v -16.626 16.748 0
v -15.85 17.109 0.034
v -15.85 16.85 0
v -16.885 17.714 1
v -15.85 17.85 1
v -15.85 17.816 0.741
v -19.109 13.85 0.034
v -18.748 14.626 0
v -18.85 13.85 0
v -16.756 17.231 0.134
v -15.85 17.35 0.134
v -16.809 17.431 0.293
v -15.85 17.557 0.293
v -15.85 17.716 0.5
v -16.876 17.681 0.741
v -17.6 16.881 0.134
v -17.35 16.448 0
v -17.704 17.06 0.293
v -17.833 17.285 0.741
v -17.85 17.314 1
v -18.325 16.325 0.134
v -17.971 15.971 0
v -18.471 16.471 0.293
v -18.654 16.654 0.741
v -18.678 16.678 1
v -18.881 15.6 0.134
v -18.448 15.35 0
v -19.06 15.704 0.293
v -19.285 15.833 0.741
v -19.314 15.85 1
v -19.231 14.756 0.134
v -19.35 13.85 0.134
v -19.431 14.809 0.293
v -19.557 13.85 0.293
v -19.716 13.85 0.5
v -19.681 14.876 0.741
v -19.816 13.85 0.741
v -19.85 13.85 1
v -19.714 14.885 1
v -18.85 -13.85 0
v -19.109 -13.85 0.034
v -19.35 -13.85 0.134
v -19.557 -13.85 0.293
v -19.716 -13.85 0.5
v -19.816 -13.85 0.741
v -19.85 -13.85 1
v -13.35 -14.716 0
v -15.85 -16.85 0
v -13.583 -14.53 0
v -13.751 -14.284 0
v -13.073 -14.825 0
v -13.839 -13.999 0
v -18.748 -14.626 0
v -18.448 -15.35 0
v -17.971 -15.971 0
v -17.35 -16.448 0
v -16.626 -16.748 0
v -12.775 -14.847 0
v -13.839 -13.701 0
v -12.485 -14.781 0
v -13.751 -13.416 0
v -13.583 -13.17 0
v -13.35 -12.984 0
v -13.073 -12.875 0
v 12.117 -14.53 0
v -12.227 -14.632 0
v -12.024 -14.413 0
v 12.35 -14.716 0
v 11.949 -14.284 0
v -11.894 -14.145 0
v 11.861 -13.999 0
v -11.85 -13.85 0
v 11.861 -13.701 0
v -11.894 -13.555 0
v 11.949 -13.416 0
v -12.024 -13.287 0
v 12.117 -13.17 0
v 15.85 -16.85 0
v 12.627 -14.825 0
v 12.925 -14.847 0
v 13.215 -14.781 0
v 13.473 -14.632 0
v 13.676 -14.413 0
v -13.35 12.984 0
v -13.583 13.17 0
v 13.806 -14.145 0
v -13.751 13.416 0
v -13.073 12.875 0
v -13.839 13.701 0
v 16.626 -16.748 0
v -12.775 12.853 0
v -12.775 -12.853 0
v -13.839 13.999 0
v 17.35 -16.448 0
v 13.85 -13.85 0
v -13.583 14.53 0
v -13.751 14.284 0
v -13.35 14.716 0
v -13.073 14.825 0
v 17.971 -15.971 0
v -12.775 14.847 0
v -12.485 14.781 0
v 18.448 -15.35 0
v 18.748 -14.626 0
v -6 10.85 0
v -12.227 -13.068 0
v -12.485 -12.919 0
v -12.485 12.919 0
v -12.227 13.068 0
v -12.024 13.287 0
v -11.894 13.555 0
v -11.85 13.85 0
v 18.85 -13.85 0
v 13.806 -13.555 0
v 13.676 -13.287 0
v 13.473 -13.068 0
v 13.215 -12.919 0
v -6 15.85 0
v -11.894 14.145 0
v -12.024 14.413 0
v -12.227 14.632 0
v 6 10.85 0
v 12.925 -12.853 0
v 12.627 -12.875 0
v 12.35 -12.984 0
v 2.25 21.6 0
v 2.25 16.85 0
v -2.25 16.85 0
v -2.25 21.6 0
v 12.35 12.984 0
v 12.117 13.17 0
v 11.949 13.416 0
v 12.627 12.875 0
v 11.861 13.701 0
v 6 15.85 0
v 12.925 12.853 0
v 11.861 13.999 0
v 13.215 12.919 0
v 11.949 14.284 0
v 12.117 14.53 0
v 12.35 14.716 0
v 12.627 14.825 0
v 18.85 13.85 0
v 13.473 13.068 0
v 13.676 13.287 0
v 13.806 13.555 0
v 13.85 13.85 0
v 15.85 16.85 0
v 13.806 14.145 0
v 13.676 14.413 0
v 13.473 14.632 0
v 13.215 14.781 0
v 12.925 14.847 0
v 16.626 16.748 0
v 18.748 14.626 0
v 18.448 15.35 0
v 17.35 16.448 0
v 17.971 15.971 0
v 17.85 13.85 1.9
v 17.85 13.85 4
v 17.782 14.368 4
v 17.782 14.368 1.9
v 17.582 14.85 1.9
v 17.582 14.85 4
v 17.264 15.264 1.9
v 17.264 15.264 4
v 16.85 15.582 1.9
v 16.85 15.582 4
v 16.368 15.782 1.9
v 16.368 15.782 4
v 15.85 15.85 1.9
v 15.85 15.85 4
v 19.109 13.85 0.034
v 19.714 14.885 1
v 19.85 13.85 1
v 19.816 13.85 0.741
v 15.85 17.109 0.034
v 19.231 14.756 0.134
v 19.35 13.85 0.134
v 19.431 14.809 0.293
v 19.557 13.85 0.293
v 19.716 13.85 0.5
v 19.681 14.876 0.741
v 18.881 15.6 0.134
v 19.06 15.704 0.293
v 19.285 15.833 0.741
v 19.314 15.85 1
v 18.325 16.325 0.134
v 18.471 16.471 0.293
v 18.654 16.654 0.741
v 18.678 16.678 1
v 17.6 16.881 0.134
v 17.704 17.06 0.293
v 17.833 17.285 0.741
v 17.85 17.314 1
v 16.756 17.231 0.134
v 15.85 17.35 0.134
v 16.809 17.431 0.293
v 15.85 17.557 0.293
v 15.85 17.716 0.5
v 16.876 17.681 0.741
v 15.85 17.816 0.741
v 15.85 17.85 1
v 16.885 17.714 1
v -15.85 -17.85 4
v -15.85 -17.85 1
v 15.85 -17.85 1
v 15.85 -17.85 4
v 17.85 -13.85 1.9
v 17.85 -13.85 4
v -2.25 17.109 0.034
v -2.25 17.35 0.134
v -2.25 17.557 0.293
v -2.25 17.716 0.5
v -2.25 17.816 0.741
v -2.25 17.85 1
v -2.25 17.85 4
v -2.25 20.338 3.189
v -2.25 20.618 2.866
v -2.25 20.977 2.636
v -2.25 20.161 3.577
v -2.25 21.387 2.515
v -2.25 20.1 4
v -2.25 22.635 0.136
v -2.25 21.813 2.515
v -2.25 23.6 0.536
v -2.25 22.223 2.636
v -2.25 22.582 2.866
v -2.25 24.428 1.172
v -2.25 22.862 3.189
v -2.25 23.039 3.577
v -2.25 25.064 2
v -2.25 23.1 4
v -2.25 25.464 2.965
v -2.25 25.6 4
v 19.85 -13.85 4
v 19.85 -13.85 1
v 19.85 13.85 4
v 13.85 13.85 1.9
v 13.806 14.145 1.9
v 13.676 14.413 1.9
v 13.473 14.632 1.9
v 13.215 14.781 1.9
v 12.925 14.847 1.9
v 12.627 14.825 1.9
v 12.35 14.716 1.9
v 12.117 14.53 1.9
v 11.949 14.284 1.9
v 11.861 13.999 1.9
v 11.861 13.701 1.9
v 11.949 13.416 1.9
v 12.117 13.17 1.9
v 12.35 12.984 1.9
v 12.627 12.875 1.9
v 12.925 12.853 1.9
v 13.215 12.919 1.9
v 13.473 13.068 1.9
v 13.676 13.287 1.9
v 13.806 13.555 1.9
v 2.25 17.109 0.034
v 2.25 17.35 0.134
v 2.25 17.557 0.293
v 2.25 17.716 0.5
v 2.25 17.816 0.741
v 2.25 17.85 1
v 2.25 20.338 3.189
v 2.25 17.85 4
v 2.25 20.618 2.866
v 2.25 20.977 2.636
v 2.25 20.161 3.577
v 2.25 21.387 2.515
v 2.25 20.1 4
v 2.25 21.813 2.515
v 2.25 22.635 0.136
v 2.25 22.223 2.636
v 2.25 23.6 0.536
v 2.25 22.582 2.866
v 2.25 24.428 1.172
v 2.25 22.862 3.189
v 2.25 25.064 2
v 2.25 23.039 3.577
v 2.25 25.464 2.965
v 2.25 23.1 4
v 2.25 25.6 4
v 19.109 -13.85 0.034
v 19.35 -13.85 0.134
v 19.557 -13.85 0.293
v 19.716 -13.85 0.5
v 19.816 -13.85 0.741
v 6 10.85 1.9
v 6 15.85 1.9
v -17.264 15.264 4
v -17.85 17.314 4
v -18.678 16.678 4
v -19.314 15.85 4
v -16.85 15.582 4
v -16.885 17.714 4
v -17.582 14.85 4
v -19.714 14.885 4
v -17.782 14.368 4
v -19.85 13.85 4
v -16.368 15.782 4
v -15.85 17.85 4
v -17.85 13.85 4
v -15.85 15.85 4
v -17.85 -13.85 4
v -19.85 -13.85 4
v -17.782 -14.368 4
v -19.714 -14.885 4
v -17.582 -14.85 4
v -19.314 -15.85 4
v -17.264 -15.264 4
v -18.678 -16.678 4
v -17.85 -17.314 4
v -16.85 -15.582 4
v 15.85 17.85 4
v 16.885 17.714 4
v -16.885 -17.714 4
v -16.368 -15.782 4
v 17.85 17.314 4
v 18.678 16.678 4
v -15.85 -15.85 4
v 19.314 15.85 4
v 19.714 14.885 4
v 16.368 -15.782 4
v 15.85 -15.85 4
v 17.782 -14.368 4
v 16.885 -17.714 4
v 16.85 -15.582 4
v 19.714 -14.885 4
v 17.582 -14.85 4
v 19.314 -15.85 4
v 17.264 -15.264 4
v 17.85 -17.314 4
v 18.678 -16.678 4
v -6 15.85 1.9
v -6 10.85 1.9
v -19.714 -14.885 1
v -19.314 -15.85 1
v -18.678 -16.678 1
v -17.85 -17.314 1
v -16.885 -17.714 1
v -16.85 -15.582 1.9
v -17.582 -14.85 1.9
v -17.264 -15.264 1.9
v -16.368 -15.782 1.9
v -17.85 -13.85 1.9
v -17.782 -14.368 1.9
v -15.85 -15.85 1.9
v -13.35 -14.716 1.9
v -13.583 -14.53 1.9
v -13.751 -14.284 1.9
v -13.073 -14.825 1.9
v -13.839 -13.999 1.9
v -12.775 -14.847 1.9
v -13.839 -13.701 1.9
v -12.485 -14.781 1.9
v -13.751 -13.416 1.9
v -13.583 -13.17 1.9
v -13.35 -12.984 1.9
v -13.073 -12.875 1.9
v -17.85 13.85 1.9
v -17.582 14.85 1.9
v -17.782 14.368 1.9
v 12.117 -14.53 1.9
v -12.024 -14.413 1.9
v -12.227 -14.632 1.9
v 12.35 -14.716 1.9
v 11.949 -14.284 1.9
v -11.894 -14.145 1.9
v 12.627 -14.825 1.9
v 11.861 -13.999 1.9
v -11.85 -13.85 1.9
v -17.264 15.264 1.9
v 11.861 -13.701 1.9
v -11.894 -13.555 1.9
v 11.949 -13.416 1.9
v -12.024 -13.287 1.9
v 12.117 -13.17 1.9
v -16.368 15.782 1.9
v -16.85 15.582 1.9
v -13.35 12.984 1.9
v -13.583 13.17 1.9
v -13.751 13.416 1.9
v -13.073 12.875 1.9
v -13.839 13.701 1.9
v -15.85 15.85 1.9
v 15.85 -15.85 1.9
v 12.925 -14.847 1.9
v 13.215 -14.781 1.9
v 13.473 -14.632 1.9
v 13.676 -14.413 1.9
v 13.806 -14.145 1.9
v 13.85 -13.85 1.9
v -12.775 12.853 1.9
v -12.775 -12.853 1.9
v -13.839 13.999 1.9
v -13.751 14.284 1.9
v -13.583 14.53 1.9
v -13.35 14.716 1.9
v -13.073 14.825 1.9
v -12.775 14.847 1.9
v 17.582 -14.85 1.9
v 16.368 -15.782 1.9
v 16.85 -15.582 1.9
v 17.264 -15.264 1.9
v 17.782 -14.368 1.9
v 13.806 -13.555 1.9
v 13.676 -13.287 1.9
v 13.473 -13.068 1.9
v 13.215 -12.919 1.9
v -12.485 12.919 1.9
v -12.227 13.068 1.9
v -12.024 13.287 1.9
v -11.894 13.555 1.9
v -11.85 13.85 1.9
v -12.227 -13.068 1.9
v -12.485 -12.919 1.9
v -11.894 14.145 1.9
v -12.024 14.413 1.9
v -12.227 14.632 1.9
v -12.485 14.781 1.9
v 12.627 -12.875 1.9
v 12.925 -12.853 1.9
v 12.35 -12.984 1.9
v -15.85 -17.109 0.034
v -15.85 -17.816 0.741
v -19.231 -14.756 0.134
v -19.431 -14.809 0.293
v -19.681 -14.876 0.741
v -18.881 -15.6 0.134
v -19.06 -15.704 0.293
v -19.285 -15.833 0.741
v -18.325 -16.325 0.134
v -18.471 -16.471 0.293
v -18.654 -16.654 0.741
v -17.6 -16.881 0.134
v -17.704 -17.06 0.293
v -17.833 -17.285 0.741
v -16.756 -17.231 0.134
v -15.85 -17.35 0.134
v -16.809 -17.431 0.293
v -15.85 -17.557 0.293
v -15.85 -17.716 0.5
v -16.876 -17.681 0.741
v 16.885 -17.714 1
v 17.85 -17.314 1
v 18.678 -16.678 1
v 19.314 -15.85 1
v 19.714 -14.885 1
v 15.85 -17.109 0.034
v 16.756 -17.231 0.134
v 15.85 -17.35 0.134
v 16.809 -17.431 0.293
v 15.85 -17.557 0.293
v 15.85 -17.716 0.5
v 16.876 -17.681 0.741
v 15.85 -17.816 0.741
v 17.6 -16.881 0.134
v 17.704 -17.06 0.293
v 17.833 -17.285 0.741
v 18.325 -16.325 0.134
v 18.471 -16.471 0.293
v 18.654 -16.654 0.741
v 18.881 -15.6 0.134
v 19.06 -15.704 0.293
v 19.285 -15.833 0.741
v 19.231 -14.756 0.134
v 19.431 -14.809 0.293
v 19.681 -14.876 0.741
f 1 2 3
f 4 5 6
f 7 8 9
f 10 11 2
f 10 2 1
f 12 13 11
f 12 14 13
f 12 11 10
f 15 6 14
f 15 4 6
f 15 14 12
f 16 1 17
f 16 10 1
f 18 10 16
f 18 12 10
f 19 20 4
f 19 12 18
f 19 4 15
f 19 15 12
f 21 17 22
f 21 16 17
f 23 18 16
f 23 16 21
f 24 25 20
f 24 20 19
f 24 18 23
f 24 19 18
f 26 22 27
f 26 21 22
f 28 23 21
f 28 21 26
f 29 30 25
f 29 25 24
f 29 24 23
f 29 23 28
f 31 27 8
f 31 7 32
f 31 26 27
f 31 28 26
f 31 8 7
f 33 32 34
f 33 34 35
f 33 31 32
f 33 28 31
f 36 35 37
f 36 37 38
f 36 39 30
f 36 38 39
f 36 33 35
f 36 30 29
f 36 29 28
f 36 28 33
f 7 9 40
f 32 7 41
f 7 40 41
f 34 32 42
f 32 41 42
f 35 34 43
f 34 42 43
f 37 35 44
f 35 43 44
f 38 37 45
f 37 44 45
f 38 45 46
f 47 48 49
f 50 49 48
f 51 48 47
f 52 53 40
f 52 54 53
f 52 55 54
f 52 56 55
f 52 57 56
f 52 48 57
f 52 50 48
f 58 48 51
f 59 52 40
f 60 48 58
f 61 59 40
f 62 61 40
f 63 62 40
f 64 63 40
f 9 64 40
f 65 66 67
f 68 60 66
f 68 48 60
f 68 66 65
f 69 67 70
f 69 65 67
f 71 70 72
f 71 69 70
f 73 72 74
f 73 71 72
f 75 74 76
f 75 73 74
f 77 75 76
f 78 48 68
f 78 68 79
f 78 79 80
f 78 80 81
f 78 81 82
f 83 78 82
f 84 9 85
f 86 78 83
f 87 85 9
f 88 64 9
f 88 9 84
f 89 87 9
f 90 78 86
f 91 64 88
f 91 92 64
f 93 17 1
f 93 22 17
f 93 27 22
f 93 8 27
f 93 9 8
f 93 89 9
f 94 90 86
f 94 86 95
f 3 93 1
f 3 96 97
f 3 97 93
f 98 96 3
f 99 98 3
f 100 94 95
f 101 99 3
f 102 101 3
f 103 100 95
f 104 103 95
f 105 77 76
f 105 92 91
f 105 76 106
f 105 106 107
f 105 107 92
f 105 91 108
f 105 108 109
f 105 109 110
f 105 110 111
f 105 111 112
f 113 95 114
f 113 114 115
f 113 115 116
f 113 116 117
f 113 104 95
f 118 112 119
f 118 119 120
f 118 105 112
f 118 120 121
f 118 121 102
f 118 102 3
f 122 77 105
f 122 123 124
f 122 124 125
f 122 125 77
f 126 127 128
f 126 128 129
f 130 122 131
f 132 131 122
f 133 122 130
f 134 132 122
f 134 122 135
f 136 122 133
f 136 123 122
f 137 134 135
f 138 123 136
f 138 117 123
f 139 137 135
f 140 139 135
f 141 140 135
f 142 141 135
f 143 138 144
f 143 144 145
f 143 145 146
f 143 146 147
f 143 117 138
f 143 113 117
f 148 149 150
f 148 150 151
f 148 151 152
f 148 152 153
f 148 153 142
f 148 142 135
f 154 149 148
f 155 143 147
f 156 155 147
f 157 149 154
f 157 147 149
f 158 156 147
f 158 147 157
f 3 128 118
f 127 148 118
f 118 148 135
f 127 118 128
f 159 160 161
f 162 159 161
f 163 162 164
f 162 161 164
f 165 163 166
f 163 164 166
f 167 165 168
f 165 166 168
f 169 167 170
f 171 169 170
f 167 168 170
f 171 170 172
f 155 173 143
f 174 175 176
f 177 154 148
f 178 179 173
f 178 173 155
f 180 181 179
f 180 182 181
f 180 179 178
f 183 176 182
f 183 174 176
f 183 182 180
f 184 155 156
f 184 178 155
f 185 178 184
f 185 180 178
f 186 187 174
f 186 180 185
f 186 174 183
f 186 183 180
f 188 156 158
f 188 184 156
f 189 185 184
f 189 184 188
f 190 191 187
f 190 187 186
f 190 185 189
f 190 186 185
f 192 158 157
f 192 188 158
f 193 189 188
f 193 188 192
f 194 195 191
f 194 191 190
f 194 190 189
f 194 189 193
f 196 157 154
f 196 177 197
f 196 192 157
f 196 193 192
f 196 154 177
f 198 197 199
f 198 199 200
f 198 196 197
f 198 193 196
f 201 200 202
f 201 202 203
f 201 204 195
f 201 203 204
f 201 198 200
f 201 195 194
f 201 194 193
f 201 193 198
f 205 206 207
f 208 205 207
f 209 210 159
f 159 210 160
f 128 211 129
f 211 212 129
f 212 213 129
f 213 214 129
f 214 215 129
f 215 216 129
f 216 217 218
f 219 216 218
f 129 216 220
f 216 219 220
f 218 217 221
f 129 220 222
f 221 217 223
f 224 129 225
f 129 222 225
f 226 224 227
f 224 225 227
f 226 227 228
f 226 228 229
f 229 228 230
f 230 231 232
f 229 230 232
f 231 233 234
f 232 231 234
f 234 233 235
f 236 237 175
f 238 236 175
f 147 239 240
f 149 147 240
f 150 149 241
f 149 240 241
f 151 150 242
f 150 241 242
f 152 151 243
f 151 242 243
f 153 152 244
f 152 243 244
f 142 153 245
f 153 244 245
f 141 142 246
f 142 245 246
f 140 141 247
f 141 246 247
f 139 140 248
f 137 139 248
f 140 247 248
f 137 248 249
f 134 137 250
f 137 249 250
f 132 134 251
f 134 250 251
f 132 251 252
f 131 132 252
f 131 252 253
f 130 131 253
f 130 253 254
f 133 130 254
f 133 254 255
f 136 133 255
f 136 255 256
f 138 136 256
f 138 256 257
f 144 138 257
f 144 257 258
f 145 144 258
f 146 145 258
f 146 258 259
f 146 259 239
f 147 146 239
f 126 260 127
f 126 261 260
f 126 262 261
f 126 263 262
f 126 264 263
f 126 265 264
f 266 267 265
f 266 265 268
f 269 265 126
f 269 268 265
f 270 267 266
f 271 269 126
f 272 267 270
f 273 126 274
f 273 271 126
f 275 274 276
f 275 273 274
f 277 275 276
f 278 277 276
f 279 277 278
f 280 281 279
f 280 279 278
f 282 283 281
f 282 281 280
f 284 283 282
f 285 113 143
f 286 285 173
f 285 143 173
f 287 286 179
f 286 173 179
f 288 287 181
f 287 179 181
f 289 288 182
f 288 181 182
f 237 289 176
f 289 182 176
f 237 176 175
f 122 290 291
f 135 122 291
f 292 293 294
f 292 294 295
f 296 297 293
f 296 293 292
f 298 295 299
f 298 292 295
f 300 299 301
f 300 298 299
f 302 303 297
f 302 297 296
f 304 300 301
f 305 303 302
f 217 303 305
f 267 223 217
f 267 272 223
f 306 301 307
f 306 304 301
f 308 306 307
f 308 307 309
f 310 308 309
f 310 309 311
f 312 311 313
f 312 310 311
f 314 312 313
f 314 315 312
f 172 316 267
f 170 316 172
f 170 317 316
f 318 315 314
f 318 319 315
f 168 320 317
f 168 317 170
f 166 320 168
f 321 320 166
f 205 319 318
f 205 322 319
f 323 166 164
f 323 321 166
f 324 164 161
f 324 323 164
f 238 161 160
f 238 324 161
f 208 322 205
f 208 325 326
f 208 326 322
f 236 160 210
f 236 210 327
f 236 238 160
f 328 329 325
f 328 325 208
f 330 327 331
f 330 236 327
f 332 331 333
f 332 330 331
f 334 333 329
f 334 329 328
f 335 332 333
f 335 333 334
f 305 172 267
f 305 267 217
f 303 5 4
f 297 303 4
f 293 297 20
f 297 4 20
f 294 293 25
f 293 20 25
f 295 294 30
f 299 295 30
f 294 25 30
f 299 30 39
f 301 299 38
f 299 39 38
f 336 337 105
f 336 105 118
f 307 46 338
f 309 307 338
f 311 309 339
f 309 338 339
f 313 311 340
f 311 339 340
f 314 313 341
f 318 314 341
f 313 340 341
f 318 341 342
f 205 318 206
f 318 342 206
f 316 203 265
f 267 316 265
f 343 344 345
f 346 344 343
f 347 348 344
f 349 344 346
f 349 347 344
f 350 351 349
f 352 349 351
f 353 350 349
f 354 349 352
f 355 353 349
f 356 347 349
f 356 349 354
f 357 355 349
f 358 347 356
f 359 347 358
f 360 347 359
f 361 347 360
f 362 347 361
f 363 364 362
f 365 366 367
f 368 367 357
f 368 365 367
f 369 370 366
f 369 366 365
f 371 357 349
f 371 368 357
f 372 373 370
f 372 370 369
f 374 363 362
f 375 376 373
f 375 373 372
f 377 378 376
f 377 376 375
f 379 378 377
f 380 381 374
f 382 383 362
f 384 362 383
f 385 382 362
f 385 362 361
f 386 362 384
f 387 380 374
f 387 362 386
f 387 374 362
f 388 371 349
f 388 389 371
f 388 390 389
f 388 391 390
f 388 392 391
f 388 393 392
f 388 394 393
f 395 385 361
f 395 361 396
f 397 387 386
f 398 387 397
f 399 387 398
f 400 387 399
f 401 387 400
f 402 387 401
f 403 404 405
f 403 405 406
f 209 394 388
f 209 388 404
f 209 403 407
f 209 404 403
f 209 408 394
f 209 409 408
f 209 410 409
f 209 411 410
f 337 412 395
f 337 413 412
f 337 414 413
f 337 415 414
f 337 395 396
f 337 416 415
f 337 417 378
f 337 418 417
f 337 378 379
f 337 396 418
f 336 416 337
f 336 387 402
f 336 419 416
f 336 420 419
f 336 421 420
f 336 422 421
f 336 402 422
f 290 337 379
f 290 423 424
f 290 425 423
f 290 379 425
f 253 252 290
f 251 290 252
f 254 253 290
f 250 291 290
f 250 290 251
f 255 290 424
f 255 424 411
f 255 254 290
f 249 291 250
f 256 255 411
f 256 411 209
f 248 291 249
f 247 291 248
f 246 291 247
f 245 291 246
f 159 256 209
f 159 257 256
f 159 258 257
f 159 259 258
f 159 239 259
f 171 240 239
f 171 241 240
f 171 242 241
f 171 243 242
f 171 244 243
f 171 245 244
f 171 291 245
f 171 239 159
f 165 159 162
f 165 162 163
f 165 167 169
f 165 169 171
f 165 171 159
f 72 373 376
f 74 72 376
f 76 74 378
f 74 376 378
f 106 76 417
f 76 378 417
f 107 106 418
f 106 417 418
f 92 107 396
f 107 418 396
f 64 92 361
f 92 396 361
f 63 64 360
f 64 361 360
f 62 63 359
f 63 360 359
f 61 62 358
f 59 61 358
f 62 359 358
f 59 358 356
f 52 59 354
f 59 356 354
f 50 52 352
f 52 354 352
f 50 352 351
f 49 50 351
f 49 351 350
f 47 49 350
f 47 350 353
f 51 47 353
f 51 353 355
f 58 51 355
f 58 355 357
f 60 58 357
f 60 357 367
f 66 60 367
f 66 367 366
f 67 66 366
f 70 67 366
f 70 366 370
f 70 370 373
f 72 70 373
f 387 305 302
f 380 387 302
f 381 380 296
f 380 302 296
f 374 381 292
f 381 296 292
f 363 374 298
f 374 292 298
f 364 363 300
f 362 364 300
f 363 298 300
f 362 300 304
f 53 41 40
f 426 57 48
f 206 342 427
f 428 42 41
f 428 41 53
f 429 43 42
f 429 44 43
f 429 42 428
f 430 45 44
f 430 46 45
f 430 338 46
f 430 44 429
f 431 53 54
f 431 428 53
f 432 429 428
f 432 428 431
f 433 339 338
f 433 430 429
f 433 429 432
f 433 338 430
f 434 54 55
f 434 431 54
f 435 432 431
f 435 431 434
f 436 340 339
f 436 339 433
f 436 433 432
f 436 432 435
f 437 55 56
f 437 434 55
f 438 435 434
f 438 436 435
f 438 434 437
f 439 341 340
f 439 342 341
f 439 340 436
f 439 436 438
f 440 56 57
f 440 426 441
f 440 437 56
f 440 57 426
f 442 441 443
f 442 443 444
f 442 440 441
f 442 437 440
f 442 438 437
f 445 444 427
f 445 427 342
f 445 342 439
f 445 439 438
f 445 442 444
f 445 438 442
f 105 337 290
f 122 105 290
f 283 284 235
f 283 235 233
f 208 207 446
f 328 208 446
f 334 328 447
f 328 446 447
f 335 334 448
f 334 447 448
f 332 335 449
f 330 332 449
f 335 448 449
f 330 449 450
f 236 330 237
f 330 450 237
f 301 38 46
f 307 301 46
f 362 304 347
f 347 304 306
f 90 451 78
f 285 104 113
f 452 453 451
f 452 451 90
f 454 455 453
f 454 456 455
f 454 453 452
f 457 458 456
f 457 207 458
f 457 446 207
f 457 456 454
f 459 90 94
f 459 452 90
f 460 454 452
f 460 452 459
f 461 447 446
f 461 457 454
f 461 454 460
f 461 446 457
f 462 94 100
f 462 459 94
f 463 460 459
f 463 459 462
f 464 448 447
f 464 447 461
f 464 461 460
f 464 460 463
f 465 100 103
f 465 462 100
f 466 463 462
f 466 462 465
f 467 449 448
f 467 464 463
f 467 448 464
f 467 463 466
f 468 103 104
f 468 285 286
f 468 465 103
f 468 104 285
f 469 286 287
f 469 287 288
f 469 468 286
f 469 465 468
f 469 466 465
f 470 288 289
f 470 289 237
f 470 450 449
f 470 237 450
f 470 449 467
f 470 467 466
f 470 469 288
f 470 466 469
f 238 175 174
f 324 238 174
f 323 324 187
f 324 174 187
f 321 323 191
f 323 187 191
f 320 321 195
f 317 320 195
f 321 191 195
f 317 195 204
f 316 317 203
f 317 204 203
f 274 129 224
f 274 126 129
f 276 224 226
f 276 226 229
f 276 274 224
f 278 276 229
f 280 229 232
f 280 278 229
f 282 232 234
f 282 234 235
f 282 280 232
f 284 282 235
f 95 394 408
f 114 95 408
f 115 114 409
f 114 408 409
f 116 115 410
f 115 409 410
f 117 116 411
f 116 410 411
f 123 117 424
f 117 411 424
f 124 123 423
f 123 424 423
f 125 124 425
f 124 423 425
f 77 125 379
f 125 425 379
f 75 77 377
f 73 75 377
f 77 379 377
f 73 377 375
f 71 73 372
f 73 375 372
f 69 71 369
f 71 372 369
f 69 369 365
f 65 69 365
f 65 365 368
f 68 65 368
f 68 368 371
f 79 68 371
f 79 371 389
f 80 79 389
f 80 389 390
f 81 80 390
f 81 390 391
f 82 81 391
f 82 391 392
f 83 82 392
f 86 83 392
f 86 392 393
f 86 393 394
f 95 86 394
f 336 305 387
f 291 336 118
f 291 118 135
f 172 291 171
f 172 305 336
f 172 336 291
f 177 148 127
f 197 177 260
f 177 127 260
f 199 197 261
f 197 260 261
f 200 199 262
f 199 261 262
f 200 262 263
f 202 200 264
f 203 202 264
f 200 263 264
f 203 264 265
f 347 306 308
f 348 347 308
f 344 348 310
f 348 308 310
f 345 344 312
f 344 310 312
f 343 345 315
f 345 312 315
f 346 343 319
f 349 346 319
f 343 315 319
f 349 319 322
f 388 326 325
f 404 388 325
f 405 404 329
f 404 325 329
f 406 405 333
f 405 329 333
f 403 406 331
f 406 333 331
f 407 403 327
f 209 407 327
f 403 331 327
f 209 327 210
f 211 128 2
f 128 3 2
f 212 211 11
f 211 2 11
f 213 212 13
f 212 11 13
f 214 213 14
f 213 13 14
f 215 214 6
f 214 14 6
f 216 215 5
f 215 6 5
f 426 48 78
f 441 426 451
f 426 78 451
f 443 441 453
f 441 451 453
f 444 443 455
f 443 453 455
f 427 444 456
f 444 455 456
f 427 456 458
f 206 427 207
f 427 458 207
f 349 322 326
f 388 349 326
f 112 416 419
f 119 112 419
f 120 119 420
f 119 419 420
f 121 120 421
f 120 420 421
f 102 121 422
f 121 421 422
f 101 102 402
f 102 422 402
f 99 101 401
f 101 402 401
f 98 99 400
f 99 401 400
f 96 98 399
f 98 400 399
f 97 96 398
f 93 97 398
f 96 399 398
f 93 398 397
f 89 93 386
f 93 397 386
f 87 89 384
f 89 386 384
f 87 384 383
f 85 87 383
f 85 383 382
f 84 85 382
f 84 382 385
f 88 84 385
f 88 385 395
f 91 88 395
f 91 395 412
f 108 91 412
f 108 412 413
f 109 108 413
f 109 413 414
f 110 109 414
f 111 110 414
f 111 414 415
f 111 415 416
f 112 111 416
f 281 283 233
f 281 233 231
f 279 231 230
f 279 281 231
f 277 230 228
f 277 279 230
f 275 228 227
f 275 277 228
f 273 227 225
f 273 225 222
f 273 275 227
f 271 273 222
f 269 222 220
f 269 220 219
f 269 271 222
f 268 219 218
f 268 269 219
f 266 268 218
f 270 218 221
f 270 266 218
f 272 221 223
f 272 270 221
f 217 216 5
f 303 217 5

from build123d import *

# Parameters (mm, degrees)
F1_DEPTH      = 4
F3_DEPTH      = 2.1
F5_DEPTH      = 2.25
F5_DEPTH_BACK = 2.25
F6_W          = 12
F6_H          = 5
F6_R          = 1
F7_DEPTH      = 25
F8_R          = 1


with BuildPart() as f1:
    # F0 (on Top) → F1 (new body)
    with BuildSketch(Plane.XY):
        with BuildLine():
            Line((19.85, -13.85), (19.85, 13.85))
            ThreePointArc((19.85, 13.85), (18.678427, 16.678427), (15.85, 17.85))
            Line((15.85, 17.85), (-15.85, 17.85))
            ThreePointArc((-15.85, 17.85), (-18.678427, 16.678427), (-19.85, 13.85))
            Line((-19.85, 13.85), (-19.85, -13.85))
            ThreePointArc((-19.85, -13.85), (-18.678427, -16.678427), (-15.85, -17.85))
            Line((-15.85, -17.85), (15.85, -17.85))
            ThreePointArc((15.85, -17.85), (18.678427, -16.678427), (19.85, -13.85))
        make_face()
    extrude(amount=F1_DEPTH)

    # F2 (on face) → F3 (cut)
    with BuildSketch(Plane.XY.offset(4)):
        with BuildLine():
            ThreePointArc((17.85, 13.85), (17.264214, 15.264214), (15.85, 15.85))
            Line((15.85, 15.85), (-15.85, 15.85))
            ThreePointArc((-15.85, 15.85), (-17.264214, 15.264214), (-17.85, 13.85))
            Line((-17.85, 13.85), (-17.85, -13.85))
            ThreePointArc((-17.85, -13.85), (-17.264214, -15.264214), (-15.85, -15.85))
            Line((-15.85, -15.85), (15.85, -15.85))
            ThreePointArc((15.85, -15.85), (17.264214, -15.264214), (17.85, -13.85))
            Line((17.85, -13.85), (17.85, 13.85))
        make_face()
    extrude(amount=-F3_DEPTH, mode=Mode.SUBTRACT)

    # F4 (on Right) → F5 (join, two sides)
    with BuildSketch(Plane.YZ) as f5_sk:
        with BuildLine():
            Line((17.85, 0), (21.6, 0))
            ThreePointArc((21.6, 0), (24.428427, 1.171573), (25.6, 4))
            Line((25.6, 4), (23.1, 4))
            ThreePointArc((23.1, 4), (21.6, 2.5), (20.1, 4))
            Line((20.1, 4), (17.85, 4))
            Line((17.85, 4), (17.85, 0))
        make_face()
        Polygon((15.85, 0), (17.85, 0), (17.85, 4), (17.6, 4), (15.85, 4), align=None)
    extrude(amount=F5_DEPTH)
    extrude(f5_sk.sketch, amount=-F5_DEPTH_BACK)

    # F6 (on face) → F7 (cut)
    with BuildSketch(Plane.XY.offset(1.9)):
        with Locations((0, 13.35)):
            Rectangle(F6_W, F6_H)
        with Locations((-12.85, 13.85)):
            Circle(F6_R)
        with Locations((12.85, 13.85)):
            Circle(F6_R)
        with Locations((-12.85, -13.85)):
            Circle(F6_R)
        with Locations((12.85, -13.85)):
            Circle(F6_R)
    extrude(amount=-F7_DEPTH, mode=Mode.SUBTRACT)

    # F8
    f8_edges = [f1.edges().sort_by_distance(p)[0] for p in [
        (-19.85, 0, 0),
    ]]
    fillet(f8_edges, radius=F8_R)


solid = f1.part
